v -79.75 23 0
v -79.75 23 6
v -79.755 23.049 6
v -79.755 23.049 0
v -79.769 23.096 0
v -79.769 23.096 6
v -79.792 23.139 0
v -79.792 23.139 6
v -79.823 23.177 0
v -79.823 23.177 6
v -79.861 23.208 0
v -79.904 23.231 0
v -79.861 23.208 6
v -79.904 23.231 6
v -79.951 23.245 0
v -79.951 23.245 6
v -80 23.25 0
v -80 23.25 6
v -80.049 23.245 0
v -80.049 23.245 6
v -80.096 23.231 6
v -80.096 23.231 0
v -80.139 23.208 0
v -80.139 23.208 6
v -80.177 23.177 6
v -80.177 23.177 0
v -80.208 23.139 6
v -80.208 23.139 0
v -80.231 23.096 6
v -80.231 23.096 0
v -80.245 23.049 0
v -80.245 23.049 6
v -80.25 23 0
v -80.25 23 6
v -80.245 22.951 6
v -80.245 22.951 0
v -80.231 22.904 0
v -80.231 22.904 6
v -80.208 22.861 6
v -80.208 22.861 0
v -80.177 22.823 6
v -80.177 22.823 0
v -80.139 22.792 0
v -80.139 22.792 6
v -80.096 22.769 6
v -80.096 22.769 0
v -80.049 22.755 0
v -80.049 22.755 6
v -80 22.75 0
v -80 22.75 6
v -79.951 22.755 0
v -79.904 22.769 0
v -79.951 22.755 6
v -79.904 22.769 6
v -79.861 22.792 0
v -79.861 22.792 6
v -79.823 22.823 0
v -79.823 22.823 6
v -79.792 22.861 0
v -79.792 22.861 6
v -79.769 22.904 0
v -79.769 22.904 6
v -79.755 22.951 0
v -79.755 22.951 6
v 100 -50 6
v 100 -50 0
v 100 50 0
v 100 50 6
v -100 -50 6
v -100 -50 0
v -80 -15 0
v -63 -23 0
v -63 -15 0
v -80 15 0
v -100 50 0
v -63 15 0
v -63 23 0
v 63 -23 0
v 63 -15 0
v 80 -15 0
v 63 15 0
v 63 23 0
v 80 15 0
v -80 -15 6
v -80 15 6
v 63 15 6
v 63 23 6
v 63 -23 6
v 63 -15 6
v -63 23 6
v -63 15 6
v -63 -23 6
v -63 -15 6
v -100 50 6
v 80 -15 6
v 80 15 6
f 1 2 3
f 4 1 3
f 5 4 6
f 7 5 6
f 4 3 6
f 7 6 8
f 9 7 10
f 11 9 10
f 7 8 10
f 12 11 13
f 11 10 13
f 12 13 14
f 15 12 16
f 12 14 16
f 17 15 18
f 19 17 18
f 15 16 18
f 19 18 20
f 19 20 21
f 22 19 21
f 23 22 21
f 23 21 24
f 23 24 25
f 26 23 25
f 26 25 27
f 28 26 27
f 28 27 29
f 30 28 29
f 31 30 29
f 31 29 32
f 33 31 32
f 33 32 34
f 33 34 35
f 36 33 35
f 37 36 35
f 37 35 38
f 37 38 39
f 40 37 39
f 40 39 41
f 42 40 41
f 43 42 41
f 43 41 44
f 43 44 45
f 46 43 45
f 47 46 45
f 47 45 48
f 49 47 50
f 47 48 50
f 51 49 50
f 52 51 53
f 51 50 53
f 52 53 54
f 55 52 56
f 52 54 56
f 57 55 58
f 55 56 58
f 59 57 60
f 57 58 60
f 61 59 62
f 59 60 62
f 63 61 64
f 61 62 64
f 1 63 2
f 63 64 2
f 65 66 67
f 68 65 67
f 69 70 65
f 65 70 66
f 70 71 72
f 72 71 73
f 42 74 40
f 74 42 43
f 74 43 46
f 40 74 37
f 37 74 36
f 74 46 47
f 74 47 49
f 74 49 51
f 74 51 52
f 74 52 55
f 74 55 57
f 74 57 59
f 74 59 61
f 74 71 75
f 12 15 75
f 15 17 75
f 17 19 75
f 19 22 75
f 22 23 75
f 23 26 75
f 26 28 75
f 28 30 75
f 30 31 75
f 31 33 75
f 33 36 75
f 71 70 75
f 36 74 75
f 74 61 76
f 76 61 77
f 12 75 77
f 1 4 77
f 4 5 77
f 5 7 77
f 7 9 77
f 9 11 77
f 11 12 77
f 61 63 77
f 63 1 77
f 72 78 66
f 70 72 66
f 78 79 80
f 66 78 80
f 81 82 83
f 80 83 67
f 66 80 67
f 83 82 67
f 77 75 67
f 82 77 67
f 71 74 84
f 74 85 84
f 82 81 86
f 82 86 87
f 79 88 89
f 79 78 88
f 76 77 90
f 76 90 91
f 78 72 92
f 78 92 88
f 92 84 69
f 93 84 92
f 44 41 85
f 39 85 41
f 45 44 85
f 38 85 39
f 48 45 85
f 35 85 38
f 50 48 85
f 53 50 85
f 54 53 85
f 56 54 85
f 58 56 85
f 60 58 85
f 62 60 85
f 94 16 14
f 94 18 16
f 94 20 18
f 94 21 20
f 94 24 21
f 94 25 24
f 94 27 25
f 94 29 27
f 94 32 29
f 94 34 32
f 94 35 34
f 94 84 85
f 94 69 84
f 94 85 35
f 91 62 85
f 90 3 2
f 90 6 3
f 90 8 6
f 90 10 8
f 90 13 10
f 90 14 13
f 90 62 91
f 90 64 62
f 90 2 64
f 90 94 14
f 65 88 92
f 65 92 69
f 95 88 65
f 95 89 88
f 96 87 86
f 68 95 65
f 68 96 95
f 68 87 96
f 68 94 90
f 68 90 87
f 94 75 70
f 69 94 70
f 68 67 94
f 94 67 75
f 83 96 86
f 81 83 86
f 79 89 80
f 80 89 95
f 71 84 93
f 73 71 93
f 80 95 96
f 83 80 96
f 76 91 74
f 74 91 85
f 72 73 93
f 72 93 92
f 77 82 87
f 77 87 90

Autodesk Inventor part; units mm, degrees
ref_plane "YZ Plane" through (0, 0, 0) normal (1, 0, 0) x (0, 1, 0)
ref_plane "XZ Plane" through (0, 0, 0) normal (0, 1, 0) x (-1, 0, 0)
ref_plane "XY Plane" through (0, 0, 0) normal (0, 0, 1) x (1, 0, 0)
sketch "Sketch1" plane through (0, 0, 0) normal (0, 0, 1) x (1, 0, 0)
  line L0 (-100, -50) -> (100, -50)
  line L1 (100, -50) -> (100, 50)
  line L2 (100, 50) -> (-100, 50)
  line L3 (-100, 50) -> (-100, -50)
  line L4 (-100, -50) -> (100, 50) construction
  line L5 (100, -50) -> (-100, 50) construction
  line L6 (-63, -23) -> (63, -23)
  line L7 (63, -23) -> (63, 23)
  line L8 (63, 23) -> (-63, 23)
  line L9 (-63, 23) -> (-63, -23)
  line L10 (-63, -23) -> (63, 23) construction
  line L11 (63, -23) -> (-63, 23) construction
  point P0 (0, 0)
  dimension "d0" = 200
  dimension "d1" = 100
  dimension "d2" = 126
  dimension "d3" = 46
extrude "Extrusion1" add sketch "Sketch1" along normal blind 6
sketch "Sketch2" plane through (0, 0, 6) normal (0, 0, 1) x (1, 0, 0)
  line L0 (-80, -15) -> (80, -15)
  line L1 (80, -15) -> (80, 15)
  line L2 (80, 15) -> (-80, 15)
  line L3 (-80, 15) -> (-80, -15)
  line L4 (-80, -15) -> (80, 15) construction
  line L5 (80, -15) -> (-80, 15) construction
  point P0 (0, 0)
  dimension "d6" = 160
  dimension "d7" = 30
extrude "Extrusion2" cut sketch "Sketch2" against normal through all
sketch "Sketch3" plane through (0, 0, 6) normal (0, 0, 1) x (1, 0, 0)
  line L0 (-90.4385, 41.5009) -> (-72.2585, 41.5009) construction
  line L1 (-72.2585, 41.5009) -> (-72.2585, 36.1823) construction
  line L2 (-72.2585, 36.1823) -> (-90.4385, 36.1823) construction
  line L3 (-90.4385, 36.1823) -> (-90.4385, 41.5009) construction
  circle A0 centre (-80, 23) radius 0.25
  line L4 (-80, -15) -> (-80, 15) projected
  line L5 (-63, 23) -> (63, 23) projected
  line L6 (100, -50) -> (100, 50) projected
  line L7 (100, 50) -> (-100, 50) projected
  line L8 (-100, 50) -> (-100, -50) projected
  line L9 (-100, -50) -> (100, -50) projected
  line L10 (63, 15) -> (80, 15) projected
  line L11 (80, 15) -> (80, -15) projected
  line L12 (80, -15) -> (63, -15) projected
  line L13 (63, -15) -> (63, -23) projected
  line L14 (63, -23) -> (-63, -23) projected
  line L15 (-63, -23) -> (-63, -15) projected
  line L16 (-63, -15) -> (-80, -15) projected
  line L17 (-80, -15) -> (-80, 15) projected
  line L18 (-80, 15) -> (-63, 15) projected
  line L19 (-63, 15) -> (-63, 23) projected
  line L20 (-63, 23) -> (63, 23) projected
  line L21 (63, 23) -> (63, 15) projected
  point P0 (0, 0)
  dimension "d10" = 0
  dimension "d11" = 0
  dimension "d12" = 0.5
extrude "Extrusion3" cut sketch "Sketch3" against normal through all contours A0
properties part number "EngravingJig"
